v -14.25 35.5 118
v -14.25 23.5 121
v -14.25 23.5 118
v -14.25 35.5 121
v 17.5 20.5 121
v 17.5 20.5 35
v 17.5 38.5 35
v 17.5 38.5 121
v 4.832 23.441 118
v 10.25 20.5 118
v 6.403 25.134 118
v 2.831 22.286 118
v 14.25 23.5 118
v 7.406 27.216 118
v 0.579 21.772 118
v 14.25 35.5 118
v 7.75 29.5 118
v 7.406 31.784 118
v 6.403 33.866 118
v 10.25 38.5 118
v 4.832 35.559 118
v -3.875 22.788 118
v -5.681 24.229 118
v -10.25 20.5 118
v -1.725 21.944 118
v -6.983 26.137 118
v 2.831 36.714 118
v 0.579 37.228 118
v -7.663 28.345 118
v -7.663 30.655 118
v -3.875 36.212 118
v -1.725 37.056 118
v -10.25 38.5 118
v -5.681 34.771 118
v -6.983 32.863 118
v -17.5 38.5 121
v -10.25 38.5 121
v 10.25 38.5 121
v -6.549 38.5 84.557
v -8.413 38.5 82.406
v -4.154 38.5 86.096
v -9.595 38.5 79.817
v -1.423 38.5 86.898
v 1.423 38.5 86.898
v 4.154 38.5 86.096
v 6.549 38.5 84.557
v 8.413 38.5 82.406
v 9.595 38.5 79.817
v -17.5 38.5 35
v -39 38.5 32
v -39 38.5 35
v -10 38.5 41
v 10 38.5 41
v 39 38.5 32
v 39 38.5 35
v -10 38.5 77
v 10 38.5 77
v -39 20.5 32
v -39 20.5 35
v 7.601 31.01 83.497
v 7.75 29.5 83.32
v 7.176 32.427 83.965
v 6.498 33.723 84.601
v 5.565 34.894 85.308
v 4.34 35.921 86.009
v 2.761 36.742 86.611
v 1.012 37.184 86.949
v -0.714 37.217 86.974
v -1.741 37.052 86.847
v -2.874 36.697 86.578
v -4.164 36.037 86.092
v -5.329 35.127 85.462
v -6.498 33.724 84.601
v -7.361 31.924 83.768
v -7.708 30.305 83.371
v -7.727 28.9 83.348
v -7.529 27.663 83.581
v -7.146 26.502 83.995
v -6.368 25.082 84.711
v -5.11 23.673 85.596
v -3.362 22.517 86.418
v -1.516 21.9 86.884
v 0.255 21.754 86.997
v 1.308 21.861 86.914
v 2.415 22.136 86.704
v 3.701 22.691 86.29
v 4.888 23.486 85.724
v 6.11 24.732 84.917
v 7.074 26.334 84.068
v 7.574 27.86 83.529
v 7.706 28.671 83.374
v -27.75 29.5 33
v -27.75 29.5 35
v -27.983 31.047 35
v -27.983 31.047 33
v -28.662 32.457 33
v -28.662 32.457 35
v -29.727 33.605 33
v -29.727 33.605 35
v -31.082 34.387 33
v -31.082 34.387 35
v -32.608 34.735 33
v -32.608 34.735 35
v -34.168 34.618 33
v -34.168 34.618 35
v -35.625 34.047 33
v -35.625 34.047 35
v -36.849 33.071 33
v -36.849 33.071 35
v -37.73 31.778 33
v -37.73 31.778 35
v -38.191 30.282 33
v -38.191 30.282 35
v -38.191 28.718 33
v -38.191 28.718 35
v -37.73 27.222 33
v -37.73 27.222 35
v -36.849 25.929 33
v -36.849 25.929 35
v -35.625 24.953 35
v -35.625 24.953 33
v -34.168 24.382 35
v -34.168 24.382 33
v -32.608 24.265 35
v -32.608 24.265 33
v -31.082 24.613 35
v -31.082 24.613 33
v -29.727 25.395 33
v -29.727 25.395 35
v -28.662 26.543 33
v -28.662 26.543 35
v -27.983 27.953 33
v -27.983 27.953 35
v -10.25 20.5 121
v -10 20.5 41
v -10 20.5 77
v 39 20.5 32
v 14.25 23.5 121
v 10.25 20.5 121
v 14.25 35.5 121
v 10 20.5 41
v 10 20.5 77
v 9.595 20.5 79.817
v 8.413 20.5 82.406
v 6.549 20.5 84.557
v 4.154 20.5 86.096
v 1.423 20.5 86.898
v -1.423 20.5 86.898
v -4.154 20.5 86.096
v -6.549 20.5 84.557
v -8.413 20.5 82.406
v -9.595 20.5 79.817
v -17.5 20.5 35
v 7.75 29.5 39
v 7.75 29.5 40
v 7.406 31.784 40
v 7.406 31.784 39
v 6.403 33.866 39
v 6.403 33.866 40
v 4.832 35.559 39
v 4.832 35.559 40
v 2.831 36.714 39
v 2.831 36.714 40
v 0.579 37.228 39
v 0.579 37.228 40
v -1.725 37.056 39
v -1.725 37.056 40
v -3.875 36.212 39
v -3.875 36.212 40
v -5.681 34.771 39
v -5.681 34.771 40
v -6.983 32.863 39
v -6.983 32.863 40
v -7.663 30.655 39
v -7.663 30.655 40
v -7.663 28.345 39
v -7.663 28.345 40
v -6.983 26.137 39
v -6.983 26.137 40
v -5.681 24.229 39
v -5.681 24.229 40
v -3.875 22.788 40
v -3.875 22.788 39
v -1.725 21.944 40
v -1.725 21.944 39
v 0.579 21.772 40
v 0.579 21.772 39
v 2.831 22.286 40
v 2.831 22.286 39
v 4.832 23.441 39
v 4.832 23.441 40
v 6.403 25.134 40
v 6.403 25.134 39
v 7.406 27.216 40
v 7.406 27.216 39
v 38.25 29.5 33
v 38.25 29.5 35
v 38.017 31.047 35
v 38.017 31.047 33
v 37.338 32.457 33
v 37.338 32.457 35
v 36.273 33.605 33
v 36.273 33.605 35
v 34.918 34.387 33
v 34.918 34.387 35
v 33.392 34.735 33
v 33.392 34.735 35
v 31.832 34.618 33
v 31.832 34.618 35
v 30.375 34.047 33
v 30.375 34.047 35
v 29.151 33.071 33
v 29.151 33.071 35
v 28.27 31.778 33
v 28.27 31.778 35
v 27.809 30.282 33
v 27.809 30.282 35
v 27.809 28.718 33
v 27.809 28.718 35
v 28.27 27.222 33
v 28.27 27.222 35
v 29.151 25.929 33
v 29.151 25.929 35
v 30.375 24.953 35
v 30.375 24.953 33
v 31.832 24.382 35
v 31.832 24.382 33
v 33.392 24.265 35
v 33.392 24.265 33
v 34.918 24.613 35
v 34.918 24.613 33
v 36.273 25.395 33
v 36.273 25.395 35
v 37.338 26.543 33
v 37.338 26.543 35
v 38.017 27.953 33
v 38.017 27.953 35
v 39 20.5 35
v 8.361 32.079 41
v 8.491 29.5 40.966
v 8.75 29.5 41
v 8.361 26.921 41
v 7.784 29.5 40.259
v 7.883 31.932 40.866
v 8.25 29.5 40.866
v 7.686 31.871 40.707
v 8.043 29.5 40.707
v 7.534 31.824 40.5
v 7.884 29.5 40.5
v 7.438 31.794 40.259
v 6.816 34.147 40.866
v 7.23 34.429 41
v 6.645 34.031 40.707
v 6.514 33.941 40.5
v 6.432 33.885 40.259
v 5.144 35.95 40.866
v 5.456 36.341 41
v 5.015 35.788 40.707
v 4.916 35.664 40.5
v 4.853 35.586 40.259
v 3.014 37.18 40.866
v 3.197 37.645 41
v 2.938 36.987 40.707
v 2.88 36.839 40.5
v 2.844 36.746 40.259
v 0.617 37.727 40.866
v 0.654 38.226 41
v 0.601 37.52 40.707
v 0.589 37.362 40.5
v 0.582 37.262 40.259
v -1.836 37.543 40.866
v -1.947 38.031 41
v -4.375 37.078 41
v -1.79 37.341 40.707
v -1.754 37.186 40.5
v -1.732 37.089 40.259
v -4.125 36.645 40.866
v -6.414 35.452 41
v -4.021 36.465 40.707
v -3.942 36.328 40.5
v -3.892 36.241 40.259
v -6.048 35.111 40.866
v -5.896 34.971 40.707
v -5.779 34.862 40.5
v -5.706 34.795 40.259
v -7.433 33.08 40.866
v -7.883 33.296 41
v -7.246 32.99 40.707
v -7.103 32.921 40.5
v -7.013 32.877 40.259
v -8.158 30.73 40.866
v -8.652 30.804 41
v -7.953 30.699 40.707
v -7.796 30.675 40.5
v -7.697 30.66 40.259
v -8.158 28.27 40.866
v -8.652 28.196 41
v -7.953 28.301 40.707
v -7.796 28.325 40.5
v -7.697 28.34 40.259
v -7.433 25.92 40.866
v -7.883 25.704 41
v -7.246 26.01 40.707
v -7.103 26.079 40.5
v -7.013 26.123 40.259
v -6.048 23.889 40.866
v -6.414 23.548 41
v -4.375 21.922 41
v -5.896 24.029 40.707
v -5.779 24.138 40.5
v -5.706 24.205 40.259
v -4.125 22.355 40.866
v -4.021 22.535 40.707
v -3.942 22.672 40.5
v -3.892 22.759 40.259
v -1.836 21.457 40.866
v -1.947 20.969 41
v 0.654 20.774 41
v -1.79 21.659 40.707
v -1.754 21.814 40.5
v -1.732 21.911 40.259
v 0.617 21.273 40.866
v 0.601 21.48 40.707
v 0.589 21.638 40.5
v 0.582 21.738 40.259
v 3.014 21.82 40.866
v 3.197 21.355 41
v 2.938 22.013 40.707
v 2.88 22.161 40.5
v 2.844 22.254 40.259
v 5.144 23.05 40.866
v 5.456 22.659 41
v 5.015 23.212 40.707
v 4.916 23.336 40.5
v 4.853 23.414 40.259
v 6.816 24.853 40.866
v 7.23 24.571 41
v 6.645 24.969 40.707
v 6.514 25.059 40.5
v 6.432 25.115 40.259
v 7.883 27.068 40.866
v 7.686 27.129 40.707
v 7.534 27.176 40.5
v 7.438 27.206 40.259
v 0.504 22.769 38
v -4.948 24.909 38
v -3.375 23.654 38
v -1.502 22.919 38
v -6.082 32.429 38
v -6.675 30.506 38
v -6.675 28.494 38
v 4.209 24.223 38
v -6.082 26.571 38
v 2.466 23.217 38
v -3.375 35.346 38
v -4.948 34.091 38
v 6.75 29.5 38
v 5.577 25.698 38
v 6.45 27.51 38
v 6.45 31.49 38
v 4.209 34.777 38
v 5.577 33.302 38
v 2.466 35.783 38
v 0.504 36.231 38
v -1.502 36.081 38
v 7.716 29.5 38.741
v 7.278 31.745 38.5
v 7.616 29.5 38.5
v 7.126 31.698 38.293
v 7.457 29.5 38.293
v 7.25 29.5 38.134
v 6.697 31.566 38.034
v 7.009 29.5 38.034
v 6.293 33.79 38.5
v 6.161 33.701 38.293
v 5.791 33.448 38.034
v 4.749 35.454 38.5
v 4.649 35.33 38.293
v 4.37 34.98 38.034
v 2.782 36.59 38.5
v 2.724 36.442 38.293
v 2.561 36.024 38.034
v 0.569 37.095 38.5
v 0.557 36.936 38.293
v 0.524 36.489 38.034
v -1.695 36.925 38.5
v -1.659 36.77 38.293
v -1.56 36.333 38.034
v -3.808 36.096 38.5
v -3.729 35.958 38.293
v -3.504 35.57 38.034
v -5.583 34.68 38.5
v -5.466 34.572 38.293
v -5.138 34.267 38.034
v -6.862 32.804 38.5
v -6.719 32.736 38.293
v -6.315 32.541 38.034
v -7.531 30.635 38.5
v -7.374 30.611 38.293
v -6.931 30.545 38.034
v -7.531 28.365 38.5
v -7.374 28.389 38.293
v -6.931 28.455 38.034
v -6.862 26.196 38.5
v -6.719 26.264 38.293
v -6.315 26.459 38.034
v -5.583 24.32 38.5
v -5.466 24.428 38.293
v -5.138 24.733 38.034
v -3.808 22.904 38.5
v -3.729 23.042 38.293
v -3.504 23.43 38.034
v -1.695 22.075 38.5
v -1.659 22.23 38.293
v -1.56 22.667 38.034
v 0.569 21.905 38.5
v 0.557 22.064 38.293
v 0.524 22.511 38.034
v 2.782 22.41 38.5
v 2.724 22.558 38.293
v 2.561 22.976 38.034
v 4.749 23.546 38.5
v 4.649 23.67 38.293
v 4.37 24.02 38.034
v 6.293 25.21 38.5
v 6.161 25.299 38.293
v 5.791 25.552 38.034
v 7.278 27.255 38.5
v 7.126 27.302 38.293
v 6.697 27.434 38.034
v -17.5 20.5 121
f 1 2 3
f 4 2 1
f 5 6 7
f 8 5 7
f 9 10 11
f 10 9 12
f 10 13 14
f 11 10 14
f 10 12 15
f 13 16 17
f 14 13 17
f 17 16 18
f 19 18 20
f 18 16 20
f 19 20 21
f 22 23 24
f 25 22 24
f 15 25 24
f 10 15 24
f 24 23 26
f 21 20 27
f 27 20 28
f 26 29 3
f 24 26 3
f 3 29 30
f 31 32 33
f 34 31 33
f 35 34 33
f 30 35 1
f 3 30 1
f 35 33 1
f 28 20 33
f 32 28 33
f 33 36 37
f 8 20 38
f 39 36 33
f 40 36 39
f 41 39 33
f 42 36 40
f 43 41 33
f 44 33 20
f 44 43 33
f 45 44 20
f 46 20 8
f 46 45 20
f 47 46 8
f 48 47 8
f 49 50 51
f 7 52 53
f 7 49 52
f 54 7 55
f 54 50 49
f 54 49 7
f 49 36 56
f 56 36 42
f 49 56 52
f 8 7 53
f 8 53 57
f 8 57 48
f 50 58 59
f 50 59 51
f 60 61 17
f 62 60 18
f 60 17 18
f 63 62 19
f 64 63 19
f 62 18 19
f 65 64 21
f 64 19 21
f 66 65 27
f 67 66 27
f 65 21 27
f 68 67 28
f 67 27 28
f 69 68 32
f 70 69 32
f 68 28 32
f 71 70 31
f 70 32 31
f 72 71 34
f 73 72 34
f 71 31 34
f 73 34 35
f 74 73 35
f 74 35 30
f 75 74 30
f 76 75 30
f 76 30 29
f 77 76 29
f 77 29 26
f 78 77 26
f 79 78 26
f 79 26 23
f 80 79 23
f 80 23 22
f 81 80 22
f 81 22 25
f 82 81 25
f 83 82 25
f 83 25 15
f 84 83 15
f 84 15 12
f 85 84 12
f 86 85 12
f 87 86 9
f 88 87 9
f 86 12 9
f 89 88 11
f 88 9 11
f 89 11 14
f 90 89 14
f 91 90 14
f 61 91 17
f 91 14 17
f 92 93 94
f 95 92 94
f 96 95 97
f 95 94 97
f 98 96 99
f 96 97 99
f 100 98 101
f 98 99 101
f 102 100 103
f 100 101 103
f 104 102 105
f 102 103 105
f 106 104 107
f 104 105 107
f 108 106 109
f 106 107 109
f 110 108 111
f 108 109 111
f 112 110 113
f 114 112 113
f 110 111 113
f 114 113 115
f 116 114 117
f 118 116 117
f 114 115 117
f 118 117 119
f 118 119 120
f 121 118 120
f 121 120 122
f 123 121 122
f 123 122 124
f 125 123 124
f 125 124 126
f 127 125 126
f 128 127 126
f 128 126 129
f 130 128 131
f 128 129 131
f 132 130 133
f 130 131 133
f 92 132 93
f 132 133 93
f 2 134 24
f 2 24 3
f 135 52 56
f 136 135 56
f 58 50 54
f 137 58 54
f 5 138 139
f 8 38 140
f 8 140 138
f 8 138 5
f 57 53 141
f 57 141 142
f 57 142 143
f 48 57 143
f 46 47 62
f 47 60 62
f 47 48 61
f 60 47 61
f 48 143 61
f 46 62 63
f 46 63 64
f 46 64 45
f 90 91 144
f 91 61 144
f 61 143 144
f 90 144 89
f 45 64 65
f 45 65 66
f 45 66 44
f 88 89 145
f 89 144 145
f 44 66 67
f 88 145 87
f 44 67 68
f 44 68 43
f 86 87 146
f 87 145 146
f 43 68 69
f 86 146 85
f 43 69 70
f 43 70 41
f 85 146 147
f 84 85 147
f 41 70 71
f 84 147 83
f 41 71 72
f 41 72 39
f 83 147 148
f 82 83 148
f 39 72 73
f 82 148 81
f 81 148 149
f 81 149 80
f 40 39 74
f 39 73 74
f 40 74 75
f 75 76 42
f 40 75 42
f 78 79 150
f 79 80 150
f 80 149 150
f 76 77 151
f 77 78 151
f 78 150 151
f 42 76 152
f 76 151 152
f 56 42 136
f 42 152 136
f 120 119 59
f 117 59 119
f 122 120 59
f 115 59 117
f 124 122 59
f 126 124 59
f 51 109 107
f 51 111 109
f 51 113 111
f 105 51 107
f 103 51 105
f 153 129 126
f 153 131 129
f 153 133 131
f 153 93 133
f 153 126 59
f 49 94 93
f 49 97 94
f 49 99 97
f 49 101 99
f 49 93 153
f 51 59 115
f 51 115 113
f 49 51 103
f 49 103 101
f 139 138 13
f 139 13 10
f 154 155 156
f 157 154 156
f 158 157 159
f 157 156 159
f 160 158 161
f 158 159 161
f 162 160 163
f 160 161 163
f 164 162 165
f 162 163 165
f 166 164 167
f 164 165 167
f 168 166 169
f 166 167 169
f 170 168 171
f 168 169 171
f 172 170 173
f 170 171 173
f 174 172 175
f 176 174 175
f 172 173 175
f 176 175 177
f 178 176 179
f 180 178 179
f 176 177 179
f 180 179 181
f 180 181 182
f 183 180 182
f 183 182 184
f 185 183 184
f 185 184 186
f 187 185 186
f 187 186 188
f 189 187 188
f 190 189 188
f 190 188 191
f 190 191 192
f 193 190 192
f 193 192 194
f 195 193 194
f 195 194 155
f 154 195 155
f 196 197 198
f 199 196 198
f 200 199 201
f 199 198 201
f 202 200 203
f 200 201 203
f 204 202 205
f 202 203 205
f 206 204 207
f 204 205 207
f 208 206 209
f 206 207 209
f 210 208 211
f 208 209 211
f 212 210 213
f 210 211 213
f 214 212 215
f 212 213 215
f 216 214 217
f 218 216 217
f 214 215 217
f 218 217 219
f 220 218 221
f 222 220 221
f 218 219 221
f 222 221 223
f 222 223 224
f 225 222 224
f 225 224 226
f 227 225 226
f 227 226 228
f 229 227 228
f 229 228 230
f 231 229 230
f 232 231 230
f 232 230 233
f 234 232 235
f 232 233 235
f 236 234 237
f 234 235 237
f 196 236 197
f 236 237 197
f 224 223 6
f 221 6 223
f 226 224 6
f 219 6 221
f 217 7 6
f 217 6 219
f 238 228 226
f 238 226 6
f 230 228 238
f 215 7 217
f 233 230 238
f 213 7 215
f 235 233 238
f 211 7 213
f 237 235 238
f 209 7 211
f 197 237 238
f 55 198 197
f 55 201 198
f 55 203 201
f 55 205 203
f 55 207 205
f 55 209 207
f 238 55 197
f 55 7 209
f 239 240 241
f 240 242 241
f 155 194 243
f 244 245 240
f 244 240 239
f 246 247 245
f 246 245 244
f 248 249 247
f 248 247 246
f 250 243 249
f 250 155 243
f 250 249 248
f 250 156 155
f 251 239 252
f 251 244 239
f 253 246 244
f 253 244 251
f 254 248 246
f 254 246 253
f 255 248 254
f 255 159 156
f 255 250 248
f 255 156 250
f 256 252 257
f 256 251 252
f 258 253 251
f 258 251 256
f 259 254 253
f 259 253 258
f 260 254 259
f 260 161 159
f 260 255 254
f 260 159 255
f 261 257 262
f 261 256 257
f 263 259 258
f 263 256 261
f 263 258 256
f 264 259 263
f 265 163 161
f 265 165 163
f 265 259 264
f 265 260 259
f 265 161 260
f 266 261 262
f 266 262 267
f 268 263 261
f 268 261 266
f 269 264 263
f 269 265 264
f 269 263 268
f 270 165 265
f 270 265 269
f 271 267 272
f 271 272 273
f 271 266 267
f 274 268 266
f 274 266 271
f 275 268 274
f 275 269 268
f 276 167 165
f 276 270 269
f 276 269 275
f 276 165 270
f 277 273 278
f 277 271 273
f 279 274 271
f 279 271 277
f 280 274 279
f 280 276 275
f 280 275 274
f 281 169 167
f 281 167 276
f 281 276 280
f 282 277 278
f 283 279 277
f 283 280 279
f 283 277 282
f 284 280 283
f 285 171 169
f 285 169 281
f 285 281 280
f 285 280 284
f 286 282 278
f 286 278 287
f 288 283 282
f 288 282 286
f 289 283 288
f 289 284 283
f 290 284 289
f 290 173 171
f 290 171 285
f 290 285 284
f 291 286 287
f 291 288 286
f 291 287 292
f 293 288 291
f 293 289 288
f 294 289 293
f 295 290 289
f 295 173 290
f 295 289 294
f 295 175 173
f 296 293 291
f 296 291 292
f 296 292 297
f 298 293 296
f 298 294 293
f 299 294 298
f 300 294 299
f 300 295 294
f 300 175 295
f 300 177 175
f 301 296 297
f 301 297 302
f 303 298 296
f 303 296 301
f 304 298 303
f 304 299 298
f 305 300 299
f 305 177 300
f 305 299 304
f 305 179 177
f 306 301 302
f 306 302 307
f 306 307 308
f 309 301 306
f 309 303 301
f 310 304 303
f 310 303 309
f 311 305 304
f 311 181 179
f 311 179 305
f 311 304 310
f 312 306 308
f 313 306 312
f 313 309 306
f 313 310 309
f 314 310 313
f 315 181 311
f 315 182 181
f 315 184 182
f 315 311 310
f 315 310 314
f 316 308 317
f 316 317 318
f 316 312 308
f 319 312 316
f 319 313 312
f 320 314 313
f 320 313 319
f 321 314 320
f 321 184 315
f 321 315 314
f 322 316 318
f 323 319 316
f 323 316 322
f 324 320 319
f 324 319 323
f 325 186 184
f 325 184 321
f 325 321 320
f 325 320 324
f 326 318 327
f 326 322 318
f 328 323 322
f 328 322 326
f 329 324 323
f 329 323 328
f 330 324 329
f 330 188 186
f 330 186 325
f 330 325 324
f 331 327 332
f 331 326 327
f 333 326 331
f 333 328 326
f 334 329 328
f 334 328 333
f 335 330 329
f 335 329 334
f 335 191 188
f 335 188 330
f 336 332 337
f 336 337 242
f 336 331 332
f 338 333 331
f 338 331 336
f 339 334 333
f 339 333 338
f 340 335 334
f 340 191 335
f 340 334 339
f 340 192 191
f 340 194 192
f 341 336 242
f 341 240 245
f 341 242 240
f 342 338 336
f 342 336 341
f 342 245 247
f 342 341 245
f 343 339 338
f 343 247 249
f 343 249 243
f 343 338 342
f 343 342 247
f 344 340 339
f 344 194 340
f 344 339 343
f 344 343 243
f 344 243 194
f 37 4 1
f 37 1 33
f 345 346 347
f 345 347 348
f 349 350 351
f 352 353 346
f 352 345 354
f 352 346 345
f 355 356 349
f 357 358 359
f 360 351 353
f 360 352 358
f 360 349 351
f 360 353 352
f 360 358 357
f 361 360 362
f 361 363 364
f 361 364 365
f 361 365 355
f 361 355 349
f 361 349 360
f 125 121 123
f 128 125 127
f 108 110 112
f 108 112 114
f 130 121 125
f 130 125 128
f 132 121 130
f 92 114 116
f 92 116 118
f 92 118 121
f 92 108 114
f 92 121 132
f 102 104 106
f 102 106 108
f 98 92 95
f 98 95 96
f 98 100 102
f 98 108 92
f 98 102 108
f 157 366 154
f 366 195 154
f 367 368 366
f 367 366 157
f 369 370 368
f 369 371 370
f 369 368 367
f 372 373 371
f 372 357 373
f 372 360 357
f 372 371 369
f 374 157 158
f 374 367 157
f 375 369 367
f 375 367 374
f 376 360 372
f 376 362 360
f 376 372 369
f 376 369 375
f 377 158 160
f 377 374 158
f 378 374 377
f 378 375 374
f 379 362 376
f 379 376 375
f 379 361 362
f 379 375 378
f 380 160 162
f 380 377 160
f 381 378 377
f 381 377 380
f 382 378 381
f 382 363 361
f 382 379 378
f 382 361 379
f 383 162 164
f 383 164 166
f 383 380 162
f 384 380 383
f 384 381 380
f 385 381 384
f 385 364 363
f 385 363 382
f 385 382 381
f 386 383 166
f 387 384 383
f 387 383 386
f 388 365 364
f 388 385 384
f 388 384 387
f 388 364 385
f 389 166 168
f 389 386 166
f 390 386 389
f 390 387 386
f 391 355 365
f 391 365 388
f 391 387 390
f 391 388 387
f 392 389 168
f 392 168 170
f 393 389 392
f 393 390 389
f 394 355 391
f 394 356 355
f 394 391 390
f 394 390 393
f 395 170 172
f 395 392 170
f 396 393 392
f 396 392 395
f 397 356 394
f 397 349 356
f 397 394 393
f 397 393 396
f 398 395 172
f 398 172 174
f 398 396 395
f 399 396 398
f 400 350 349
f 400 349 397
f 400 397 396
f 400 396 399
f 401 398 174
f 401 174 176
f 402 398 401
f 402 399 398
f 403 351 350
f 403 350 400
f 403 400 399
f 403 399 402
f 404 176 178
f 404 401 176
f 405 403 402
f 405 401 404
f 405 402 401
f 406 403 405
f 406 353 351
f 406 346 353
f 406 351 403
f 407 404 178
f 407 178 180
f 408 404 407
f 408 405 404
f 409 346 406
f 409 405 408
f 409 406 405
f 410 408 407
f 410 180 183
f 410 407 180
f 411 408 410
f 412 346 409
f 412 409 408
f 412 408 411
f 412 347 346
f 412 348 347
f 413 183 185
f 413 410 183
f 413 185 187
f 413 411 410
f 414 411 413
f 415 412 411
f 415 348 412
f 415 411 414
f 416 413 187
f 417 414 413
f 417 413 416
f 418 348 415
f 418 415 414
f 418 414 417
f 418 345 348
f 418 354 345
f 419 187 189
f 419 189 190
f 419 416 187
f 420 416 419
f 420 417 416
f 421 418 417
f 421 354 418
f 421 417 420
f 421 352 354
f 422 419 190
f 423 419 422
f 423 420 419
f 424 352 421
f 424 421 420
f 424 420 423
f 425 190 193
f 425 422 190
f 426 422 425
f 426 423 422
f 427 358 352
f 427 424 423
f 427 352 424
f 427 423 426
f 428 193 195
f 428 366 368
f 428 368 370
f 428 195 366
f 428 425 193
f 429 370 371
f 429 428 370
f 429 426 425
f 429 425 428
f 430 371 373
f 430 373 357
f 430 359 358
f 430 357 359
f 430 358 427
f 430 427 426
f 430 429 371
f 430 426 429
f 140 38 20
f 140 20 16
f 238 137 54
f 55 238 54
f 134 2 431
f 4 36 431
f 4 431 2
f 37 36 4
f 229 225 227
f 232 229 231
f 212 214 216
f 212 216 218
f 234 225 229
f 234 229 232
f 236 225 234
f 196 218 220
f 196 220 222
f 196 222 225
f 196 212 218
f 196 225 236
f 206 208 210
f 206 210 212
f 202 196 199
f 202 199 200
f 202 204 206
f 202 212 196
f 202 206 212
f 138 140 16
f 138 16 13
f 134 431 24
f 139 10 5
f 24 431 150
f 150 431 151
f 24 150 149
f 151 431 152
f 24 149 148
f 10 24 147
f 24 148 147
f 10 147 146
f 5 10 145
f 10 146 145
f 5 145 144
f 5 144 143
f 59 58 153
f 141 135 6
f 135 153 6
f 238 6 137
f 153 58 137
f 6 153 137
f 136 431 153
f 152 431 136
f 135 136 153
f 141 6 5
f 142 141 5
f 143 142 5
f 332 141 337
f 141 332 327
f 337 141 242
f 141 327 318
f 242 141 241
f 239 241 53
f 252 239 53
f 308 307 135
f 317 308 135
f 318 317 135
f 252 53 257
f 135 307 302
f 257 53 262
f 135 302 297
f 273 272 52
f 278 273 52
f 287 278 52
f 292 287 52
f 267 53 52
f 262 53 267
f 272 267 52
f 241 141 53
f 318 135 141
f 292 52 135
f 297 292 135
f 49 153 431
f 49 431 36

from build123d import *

# Parameters (mm, degrees)
SKETCH063_W            = 78
SKETCH063_H            = 18
PAD020_DEPTH           = 3
SKETCH064_R            = 5.25
POCKET040_DEPTH        = 2
LINEARPATTERN001_COUNT = 2
LINEARPATTERN001_PITCH = 66
SKETCH065_W            = 35
SKETCH065_H            = 18
PAD021_DEPTH           = 86
SKETCH066_R            = 7.75
POCKET041_DEPTH        = 83
POCKET042_DEPTH        = 3
SKETCH068_W            = 20
SKETCH068_H            = 36
POCKET043_DEPTH        = 18.001
SKETCH069_R            = 10
POCKET044_DEPTH        = 18.001
FILLET_R               = 1


with BuildPart() as part:
    # Sketch063 → Pad020 (new body)
    with BuildSketch(Plane.XY):
        with Locations((0, 29.5)):
            Rectangle(SKETCH063_W, SKETCH063_H)
    extrude(amount=PAD020_DEPTH)

    # Sketch064 (on Face6 of Pad020) → Pocket040 (cut)
    with BuildSketch(Plane.XY.offset(3)):
        with Locations((-33, 29.5)):
            Circle(SKETCH064_R)
    pocket040 = extrude(amount=-POCKET040_DEPTH, mode=Mode.SUBTRACT)

    # LinearPattern001: Pocket040 ×2
    with Locations(*[(i * LINEARPATTERN001_PITCH, 0, 0) for i in range(1, LINEARPATTERN001_COUNT)]):
        add(pocket040, mode=Mode.SUBTRACT)

    # Sketch065 (on Face5 of LinearPattern001) → Pad021 (join)
    with BuildSketch(Plane.XY.offset(3)):
        with Locations((0, 29.5)):
            Rectangle(SKETCH065_W, SKETCH065_H)
    extrude(amount=PAD021_DEPTH)

    # Sketch066 (on Face12 of Pad021) → Pocket041 (cut)
    with BuildSketch(Plane.XY.offset(89)):
        with Locations((0, 29.5)):
            Circle(SKETCH066_R)
    extrude(amount=-POCKET041_DEPTH, mode=Mode.SUBTRACT)

    # Sketch067 (on Face12 of Pocket041) → Pocket042 (cut)
    with BuildSketch(Plane.XY.offset(89)):
        Polygon((-10.25, 38.5), (10.25, 38.5), (14.25, 35.5), (14.25, 23.5), (10.25, 20.5), (-10.25, 20.5), (-14.25, 23.5), (-14.25, 35.5), align=None)
    extrude(amount=-POCKET042_DEPTH, mode=Mode.SUBTRACT)

    # Sketch068 (on Face6 of Pocket042) → Pocket043 (cut, through all)
    with BuildSketch(Plane(origin=(0, 38.5, 0), x_dir=(-1, 0, 0), z_dir=(0, 1, 0))):
        with Locations((0, 27)):
            Rectangle(SKETCH068_W, SKETCH068_H)
    extrude(amount=-POCKET043_DEPTH, mode=Mode.SUBTRACT)

    # Sketch069 (on Face22 of Pocket043) → Pocket044 (cut, through all)
    with BuildSketch(Plane.XZ.offset(-20.5)):
        with Locations((0, 45)):
            Circle(SKETCH069_R)
    extrude(amount=-POCKET044_DEPTH, mode=Mode.SUBTRACT)

    # Fillet
    fillet_edges = [part.edges().sort_by_distance(p)[0] for p in [
        (-7.75, 29.5, 9),
        (7.75, 29.5, 7.5),
        (-7.75, 29.5, 6),
    ]]
    fillet(fillet_edges, radius=FILLET_R)


with BuildPart() as part_1:
    # Body005 placement: moved
    add(part.part.moved(Location((0, 0, 32))))


solid = part_1.part
